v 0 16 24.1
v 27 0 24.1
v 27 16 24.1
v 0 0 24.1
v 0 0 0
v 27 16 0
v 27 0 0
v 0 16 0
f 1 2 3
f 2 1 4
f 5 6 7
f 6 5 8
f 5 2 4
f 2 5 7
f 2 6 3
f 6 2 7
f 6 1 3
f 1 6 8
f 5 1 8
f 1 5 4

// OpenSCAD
// a rectangular prism to hold the reed switches closer to the window

STRIP_X = 27;
STRIP_Y = 16;

REED_X = 23;
REED_Y = 13.9;
REED_Z = 5.9;

FRAME_TO_COVER = 33;

MAGNET_Z = 3;

Z = FRAME_TO_COVER - MAGNET_Z - REED_Z;

cube([STRIP_X, STRIP_Y, Z]);
